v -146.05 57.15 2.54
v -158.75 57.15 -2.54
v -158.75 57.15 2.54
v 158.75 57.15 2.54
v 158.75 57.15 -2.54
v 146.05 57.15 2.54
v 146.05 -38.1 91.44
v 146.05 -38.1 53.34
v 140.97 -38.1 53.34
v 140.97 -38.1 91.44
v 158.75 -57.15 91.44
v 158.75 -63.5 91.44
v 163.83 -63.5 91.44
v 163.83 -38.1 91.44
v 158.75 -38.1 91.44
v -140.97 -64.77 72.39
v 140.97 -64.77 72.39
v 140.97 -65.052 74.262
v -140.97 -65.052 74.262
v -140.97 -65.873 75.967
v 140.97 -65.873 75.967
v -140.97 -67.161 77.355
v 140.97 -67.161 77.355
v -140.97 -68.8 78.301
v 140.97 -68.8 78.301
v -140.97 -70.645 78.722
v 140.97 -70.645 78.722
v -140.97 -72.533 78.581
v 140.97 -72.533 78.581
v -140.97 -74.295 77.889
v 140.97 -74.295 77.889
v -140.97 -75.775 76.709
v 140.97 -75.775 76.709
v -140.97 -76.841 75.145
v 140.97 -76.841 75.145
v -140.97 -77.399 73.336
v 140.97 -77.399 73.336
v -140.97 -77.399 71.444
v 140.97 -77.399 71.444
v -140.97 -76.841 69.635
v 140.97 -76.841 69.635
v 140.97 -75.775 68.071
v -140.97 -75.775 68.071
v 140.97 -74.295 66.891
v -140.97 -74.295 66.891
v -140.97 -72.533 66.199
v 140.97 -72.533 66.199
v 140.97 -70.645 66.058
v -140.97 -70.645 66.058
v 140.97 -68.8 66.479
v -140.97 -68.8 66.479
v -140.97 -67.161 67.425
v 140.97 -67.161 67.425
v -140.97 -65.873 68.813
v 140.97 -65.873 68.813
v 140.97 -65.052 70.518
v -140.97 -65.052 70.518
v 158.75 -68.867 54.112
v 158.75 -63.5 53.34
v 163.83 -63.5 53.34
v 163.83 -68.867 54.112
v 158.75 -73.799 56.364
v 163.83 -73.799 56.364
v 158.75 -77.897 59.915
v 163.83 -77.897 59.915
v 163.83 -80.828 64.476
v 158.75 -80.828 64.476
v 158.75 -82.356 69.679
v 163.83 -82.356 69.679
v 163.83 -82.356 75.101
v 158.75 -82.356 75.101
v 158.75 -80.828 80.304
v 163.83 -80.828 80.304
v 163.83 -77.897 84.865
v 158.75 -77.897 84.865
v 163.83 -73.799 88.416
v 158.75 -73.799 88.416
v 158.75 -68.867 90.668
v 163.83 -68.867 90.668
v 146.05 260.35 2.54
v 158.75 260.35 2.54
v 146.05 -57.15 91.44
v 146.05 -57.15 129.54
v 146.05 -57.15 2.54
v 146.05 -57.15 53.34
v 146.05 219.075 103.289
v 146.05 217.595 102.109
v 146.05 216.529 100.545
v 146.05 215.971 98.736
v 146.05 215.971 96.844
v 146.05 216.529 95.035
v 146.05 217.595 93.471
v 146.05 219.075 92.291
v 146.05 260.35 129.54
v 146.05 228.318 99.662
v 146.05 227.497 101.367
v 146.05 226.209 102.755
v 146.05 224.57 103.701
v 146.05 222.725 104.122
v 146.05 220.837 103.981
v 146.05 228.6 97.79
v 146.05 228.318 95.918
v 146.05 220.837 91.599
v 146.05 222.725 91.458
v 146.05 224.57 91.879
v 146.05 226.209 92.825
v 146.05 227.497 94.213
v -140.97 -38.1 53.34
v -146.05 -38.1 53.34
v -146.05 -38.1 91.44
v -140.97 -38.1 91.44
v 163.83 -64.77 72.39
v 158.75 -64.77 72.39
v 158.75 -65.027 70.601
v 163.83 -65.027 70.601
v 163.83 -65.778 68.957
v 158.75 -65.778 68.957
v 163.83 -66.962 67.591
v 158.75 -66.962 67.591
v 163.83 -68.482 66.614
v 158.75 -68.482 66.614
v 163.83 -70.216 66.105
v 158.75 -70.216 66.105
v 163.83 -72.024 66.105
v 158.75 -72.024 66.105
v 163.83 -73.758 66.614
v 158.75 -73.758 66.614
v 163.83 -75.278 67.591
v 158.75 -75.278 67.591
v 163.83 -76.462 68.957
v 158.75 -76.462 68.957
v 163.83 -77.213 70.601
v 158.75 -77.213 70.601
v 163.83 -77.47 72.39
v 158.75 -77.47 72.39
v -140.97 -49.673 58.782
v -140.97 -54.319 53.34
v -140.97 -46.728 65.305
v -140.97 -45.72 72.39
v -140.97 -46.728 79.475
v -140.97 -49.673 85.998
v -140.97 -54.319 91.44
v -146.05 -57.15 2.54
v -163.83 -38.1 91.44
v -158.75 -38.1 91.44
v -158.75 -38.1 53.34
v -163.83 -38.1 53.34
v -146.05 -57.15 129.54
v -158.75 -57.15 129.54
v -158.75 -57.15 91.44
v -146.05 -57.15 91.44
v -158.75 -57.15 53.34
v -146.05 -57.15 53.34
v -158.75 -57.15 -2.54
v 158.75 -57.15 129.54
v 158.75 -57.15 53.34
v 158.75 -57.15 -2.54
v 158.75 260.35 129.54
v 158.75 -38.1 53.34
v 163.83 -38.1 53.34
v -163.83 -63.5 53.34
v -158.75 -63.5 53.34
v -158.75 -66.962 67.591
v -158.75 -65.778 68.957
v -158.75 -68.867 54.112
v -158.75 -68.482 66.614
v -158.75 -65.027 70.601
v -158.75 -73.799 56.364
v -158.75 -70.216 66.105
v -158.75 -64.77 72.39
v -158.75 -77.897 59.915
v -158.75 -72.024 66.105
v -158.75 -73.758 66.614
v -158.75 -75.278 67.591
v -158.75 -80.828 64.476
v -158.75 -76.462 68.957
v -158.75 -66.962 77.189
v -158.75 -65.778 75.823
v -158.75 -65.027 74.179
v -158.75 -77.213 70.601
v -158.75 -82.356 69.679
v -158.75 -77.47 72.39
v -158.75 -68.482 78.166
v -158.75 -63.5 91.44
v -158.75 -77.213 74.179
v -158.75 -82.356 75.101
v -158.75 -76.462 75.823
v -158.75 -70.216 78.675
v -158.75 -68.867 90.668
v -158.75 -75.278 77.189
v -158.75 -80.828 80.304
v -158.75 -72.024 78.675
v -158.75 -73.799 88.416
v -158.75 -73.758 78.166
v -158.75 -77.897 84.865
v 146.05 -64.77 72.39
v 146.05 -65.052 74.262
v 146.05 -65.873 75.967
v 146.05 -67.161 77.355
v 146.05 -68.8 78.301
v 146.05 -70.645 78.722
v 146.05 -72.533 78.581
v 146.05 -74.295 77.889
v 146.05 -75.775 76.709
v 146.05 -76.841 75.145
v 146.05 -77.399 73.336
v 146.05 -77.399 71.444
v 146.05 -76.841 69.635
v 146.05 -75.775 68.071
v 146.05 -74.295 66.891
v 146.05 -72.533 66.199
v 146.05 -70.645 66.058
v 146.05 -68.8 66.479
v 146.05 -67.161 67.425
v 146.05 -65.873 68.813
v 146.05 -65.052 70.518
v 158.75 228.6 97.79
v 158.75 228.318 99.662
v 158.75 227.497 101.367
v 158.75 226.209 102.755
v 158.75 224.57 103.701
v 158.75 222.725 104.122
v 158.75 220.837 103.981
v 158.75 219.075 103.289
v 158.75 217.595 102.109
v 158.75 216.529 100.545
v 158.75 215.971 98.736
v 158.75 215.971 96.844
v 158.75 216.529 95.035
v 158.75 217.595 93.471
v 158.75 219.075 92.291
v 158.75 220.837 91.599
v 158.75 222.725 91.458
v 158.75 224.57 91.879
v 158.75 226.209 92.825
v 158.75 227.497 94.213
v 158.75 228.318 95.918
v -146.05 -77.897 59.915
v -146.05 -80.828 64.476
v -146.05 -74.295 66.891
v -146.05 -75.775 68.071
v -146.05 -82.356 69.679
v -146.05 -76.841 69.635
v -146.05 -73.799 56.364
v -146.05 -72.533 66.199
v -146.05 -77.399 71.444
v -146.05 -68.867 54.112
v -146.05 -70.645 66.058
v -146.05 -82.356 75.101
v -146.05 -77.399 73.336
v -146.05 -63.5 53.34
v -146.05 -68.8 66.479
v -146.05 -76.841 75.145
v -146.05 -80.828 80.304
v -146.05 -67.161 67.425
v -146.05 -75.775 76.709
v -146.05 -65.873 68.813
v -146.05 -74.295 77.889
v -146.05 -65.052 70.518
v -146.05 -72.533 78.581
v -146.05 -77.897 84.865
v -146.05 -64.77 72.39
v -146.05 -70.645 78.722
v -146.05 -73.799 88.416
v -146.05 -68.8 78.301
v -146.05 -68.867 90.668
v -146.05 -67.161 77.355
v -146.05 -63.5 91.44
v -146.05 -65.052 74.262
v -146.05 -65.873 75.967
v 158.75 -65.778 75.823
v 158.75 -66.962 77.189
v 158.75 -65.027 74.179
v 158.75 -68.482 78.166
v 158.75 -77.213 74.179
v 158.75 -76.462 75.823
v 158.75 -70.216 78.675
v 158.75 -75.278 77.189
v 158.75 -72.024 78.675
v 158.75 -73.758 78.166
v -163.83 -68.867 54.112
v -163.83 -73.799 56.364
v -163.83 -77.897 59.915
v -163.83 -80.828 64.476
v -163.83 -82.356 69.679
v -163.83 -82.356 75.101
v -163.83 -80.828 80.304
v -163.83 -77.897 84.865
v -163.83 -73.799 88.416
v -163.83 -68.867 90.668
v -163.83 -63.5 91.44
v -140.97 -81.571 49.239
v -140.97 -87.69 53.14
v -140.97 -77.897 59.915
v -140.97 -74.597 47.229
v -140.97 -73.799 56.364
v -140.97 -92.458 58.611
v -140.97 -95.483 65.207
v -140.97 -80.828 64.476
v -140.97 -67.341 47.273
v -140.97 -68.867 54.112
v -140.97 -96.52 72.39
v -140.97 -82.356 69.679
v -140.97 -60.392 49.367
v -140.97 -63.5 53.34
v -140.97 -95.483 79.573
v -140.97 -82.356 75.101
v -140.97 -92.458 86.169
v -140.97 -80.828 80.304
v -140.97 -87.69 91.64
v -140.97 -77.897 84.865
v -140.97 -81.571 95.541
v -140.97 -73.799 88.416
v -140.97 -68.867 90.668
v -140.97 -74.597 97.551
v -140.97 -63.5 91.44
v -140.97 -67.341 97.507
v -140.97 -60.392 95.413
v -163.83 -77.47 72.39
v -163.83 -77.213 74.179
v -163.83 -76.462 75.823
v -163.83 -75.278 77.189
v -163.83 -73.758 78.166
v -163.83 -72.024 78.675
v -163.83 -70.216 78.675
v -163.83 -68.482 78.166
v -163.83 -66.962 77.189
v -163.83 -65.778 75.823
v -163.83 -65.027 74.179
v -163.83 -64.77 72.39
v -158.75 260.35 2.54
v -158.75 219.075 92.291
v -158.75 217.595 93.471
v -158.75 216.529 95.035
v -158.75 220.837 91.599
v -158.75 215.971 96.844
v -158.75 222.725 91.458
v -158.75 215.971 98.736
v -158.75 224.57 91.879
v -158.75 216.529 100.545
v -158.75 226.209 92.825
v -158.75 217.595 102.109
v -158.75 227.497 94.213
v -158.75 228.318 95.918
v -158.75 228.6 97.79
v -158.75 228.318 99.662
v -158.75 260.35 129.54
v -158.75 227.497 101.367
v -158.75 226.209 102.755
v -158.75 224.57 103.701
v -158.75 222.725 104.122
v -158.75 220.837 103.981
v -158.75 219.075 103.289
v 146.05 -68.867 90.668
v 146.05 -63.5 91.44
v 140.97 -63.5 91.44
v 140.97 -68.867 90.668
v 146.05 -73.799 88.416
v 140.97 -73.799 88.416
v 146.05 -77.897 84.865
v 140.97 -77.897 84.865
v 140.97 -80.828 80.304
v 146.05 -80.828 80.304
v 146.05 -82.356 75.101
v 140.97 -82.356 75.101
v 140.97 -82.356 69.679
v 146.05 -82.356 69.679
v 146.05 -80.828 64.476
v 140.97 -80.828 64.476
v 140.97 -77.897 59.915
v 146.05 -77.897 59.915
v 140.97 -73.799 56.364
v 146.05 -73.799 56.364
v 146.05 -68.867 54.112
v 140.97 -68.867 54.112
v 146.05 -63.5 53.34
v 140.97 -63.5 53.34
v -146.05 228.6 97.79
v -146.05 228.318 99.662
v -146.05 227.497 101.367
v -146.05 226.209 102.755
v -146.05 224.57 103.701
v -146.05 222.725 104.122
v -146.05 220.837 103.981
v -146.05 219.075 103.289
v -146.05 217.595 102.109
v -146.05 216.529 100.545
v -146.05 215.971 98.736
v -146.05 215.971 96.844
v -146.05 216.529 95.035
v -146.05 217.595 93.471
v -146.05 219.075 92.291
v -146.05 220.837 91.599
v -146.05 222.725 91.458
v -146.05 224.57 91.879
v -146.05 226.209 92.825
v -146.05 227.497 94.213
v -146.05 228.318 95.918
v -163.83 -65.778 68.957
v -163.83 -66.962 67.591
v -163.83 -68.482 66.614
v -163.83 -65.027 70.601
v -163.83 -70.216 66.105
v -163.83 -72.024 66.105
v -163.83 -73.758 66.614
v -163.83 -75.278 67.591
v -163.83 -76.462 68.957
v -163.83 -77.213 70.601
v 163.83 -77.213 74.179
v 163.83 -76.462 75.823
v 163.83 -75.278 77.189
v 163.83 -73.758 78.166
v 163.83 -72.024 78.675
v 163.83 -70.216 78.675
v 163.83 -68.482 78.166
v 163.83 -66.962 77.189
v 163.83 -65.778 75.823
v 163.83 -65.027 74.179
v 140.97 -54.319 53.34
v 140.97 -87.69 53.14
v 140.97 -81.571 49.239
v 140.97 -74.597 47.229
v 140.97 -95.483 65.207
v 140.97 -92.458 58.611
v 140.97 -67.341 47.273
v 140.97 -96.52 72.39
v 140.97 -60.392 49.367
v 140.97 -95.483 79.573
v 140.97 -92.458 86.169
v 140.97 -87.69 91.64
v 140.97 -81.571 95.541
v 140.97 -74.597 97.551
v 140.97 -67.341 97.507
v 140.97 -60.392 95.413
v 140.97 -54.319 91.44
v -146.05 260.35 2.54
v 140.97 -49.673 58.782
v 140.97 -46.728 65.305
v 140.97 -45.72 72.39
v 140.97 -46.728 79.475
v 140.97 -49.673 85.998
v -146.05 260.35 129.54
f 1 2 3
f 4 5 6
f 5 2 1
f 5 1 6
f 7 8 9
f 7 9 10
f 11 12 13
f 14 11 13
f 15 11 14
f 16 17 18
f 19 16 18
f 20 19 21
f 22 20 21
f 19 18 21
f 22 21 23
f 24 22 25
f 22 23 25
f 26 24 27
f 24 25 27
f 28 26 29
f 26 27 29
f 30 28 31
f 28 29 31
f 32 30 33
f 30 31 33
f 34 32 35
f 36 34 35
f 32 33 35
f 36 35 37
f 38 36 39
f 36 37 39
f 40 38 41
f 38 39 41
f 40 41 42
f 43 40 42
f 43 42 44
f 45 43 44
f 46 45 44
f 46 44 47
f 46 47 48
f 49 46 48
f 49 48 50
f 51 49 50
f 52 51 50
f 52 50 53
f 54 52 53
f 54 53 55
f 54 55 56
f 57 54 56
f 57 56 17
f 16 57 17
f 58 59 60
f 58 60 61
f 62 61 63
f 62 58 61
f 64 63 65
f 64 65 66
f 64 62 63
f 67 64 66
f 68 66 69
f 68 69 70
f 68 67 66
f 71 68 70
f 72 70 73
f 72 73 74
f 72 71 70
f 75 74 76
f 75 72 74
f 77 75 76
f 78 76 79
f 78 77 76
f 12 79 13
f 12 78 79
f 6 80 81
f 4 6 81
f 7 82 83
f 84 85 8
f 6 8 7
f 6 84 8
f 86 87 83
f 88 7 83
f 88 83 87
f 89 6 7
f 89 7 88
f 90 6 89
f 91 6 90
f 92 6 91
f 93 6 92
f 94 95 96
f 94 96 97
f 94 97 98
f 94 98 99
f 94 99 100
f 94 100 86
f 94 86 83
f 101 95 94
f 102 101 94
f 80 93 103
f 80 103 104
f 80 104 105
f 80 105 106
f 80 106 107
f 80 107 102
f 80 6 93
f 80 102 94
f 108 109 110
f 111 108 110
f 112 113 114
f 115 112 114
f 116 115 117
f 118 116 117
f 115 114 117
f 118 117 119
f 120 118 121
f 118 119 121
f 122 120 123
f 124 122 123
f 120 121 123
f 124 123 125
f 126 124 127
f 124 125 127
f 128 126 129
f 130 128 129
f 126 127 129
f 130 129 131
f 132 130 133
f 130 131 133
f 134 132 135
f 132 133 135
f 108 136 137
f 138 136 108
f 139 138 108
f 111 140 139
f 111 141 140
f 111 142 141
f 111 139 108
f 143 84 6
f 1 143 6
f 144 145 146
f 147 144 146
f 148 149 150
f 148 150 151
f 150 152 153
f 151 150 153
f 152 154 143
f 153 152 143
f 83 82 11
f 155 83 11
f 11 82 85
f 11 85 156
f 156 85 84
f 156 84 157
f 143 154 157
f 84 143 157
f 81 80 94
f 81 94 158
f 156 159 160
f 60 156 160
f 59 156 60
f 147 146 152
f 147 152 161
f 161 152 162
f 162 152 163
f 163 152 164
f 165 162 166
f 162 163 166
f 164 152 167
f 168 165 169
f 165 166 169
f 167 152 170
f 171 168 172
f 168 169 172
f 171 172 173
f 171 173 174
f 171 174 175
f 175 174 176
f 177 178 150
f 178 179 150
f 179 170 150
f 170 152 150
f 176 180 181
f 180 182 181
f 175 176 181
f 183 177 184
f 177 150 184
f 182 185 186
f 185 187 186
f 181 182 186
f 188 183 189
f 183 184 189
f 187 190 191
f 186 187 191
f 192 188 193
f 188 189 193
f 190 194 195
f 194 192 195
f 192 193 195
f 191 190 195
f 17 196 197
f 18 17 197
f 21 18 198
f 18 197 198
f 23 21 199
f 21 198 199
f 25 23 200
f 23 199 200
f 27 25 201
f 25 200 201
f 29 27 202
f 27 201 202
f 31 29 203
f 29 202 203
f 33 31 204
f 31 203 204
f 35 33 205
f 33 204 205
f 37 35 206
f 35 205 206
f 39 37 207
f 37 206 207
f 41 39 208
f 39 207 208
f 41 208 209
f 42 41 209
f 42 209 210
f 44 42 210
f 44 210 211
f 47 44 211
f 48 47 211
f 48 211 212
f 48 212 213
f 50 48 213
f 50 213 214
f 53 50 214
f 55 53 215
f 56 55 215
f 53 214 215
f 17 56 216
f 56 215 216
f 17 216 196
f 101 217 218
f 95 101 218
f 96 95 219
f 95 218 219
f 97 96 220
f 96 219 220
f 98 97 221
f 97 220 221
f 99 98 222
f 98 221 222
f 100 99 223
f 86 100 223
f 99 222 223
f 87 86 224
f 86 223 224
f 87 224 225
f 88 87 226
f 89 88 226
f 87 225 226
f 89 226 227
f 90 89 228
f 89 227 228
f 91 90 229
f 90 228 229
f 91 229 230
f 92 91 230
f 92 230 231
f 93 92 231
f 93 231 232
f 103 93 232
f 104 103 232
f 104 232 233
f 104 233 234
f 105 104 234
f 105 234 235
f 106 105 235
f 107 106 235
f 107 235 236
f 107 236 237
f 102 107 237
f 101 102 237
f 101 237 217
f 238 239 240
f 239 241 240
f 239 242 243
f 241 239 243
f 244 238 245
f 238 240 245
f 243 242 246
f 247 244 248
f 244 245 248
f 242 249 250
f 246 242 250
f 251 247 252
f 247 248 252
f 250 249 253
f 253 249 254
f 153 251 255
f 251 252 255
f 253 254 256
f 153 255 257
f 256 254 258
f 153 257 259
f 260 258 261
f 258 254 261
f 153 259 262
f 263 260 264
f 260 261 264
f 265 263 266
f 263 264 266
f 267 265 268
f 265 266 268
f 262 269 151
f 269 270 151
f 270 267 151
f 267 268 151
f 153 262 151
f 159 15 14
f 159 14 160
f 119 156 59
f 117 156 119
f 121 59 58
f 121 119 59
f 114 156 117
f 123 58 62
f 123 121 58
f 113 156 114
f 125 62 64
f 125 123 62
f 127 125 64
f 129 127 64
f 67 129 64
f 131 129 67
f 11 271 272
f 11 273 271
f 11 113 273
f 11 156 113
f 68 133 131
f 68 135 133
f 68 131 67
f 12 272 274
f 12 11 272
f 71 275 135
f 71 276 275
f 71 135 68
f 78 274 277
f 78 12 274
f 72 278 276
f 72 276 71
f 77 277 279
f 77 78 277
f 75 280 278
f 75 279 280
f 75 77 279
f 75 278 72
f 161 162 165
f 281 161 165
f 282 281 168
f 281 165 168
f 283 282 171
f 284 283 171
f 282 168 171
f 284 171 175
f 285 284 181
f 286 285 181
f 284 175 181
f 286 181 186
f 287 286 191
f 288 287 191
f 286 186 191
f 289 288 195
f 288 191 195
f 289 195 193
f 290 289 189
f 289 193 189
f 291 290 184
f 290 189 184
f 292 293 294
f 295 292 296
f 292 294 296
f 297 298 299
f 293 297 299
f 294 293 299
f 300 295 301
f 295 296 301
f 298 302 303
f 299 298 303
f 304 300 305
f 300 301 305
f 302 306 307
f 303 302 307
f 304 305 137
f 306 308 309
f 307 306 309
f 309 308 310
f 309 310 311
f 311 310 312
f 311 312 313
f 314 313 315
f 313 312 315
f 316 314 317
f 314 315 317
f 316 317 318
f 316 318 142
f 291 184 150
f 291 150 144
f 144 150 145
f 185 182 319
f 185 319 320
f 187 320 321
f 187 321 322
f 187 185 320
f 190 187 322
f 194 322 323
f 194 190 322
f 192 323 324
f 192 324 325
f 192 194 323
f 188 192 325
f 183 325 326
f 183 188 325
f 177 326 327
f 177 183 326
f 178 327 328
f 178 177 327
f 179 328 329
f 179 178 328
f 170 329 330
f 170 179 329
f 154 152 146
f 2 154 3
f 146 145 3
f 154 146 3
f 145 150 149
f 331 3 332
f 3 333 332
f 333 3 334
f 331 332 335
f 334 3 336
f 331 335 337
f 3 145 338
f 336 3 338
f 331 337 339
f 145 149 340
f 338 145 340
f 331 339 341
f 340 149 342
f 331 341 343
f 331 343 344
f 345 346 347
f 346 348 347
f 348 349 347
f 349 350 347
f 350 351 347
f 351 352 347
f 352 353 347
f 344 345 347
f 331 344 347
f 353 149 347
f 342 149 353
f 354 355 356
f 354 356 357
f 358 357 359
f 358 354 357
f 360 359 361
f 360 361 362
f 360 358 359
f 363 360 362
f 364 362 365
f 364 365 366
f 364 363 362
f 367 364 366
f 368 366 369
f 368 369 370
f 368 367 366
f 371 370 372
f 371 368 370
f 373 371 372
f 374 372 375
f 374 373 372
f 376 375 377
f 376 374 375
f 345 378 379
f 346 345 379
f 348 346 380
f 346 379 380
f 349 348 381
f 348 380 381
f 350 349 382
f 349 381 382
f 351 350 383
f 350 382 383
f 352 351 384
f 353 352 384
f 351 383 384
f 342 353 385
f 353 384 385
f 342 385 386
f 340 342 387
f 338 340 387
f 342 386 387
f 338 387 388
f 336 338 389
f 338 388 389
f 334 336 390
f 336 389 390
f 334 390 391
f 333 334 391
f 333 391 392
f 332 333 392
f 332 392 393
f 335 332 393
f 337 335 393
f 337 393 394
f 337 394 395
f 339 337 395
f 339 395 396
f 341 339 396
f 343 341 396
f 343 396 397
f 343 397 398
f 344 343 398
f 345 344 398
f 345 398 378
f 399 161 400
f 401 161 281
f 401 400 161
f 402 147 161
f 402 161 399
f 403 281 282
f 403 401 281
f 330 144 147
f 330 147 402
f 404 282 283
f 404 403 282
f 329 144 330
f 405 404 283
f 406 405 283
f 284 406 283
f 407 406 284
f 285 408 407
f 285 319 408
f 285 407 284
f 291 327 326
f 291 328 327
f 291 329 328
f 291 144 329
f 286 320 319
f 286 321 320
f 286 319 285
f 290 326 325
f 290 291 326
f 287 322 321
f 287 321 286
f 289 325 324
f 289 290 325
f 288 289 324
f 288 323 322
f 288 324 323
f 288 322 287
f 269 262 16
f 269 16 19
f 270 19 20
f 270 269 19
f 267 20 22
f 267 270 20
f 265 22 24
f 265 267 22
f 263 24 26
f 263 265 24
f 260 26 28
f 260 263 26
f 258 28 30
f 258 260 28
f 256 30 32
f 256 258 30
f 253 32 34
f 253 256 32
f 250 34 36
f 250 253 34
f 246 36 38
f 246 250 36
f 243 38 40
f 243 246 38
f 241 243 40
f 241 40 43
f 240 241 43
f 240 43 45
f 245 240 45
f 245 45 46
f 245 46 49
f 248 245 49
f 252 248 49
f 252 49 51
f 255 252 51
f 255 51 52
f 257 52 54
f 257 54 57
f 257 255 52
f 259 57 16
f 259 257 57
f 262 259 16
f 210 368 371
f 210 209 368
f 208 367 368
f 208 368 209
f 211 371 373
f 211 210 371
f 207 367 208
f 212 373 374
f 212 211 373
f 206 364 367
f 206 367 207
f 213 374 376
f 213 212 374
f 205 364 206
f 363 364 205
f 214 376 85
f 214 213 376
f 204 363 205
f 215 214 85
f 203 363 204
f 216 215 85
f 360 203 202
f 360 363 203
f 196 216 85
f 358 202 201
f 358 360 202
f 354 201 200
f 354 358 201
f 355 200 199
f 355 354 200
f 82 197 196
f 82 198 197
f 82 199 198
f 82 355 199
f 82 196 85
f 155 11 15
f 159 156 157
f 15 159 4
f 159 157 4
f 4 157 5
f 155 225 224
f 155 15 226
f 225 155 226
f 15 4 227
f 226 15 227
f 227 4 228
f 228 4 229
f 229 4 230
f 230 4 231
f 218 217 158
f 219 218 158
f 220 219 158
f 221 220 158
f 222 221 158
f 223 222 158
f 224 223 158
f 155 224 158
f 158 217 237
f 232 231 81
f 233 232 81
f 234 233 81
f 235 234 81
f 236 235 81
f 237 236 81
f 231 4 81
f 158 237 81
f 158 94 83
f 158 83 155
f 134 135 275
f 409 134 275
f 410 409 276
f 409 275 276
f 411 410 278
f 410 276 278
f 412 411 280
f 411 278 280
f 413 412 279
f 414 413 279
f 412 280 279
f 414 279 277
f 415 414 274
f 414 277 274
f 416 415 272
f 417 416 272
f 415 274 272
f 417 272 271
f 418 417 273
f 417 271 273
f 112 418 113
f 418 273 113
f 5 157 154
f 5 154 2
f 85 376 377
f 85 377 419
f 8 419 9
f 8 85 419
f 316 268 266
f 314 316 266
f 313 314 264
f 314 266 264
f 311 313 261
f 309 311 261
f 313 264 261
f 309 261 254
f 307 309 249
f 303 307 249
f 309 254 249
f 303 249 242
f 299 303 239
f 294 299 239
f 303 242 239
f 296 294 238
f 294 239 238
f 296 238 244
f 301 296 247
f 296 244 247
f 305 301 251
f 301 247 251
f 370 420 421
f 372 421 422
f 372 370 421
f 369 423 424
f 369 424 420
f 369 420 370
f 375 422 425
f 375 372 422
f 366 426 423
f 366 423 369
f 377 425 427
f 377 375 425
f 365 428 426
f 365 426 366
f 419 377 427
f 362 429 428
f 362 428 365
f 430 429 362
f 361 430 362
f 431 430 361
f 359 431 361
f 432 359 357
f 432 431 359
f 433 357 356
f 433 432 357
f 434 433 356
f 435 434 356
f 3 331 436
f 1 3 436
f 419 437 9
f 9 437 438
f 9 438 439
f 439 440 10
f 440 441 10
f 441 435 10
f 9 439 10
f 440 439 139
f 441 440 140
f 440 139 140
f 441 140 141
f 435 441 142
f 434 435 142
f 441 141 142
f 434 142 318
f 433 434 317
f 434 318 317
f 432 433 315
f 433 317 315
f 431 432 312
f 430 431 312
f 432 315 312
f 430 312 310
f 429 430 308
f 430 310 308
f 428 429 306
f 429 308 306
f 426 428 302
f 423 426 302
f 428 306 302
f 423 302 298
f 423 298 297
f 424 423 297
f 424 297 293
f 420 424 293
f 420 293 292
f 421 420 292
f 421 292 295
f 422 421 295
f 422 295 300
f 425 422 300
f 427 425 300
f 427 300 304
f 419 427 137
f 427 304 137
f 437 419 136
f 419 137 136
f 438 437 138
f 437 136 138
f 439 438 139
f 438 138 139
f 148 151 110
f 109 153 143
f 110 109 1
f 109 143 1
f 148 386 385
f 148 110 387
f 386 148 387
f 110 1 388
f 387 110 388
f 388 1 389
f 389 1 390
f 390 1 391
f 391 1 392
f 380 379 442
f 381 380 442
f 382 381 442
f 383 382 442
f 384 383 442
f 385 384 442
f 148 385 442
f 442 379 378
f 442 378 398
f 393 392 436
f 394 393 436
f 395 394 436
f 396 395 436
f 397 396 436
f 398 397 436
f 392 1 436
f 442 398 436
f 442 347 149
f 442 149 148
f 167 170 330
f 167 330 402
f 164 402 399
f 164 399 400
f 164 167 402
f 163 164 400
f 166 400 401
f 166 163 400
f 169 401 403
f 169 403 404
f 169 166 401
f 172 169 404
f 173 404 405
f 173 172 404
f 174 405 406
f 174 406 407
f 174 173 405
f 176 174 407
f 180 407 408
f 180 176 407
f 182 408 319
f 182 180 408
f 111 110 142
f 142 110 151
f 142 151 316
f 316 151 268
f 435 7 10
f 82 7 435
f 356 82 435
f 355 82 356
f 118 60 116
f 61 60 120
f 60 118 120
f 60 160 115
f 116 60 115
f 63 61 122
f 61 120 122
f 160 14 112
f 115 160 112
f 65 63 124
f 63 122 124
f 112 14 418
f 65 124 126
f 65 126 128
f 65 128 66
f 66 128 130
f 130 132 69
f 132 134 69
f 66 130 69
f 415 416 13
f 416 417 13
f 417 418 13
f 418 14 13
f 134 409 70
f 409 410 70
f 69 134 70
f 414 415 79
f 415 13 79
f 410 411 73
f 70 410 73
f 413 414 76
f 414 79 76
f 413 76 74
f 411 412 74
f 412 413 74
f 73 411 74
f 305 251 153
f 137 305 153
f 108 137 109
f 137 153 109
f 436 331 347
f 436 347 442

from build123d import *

# Parameters (mm, degrees)
F0_W      = 114.3
F0_H      = 5.08
F1_DEPTH  = 158.75
F2_W      = 12.7
F2_H      = 317.5
F3_DEPTH  = 127
F4_R      = 6.35
F5_DEPTH  = 5.08
F6_R      = 6.35
F7_DEPTH  = 5.08
F9_R      = 25.4
F10_DEPTH = 281.94
F11_R     = 6.35
F12_DEPTH = 327.66
F13_R     = 6.35
F14_DEPTH = 322.581


with BuildPart() as f1:
    # F0 (on Right) → F1 (new body, symmetric)
    with BuildSketch(Plane.YZ):
        Rectangle(F0_W, F0_H)
    extrude(amount=F1_DEPTH, both=True)

    # F2 (on face) → F3 (join)
    with BuildSketch(Plane.XY.offset(2.54)):
        with Locations((152.4, 101.6)):
            Rectangle(F2_W, F2_H)
        with Locations((-152.4, 101.6)):
            Rectangle(F2_W, F2_H)
    extrude(amount=F3_DEPTH)

    # F4 (on face) → F5 (join)
    with BuildSketch(Plane.YZ.offset(-146.05)):
        with BuildLine():
            Line((-38.1, 91.44), (-63.5, 91.44))
            ThreePointArc((-63.5, 91.44), (-82.55, 72.39), (-63.5, 53.34))
            Line((-63.5, 53.34), (-38.1, 53.34))
            Line((-38.1, 53.34), (-38.1, 91.44))
        make_face()
        with Locations((-71.12, 72.39)):
            Circle(F4_R, mode=Mode.SUBTRACT)
    extrude(amount=F5_DEPTH)

    # F6 (on face) → F7 (join)
    with BuildSketch(Plane(origin=(-158.75, 0, 0), x_dir=(0, -1, 0), z_dir=(-1, 0, 0))):
        with BuildLine():
            Line((63.5, 91.44), (38.1, 91.44))
            Line((38.1, 91.44), (38.1, 53.34))
            Line((38.1, 53.34), (63.5, 53.34))
            ThreePointArc((63.5, 53.34), (82.55, 72.39), (63.5, 91.44))
        make_face()
        with Locations((71.12, 72.39)):
            Circle(F6_R, mode=Mode.SUBTRACT)
    extrude(amount=F7_DEPTH)

    # F8: F1 across plane


with BuildPart() as f1_1:
    add(f1.part)
    add(f1.part.mirror(Plane.YZ))

    # F9 (on face) → F10 (join)
    with BuildSketch(Plane.YZ.offset(-140.97)):
        with Locations((-71.12, 72.39)):
            Circle(F9_R)
    extrude(amount=F10_DEPTH)

    # F11 (on face) → F12 (cut)
    with BuildSketch(Plane.YZ.offset(163.83)):
        with Locations((-71.12, 72.39)):
            Circle(F11_R)
    extrude(amount=-F12_DEPTH, mode=Mode.SUBTRACT)

    # F13 (on face) → F14 (cut, through all)
    with BuildSketch(Plane.YZ.offset(158.75)):
        with Locations((222.25, 97.79)):
            Circle(F13_R)
    extrude(amount=-F14_DEPTH, mode=Mode.SUBTRACT)


solid = f1_1.part
